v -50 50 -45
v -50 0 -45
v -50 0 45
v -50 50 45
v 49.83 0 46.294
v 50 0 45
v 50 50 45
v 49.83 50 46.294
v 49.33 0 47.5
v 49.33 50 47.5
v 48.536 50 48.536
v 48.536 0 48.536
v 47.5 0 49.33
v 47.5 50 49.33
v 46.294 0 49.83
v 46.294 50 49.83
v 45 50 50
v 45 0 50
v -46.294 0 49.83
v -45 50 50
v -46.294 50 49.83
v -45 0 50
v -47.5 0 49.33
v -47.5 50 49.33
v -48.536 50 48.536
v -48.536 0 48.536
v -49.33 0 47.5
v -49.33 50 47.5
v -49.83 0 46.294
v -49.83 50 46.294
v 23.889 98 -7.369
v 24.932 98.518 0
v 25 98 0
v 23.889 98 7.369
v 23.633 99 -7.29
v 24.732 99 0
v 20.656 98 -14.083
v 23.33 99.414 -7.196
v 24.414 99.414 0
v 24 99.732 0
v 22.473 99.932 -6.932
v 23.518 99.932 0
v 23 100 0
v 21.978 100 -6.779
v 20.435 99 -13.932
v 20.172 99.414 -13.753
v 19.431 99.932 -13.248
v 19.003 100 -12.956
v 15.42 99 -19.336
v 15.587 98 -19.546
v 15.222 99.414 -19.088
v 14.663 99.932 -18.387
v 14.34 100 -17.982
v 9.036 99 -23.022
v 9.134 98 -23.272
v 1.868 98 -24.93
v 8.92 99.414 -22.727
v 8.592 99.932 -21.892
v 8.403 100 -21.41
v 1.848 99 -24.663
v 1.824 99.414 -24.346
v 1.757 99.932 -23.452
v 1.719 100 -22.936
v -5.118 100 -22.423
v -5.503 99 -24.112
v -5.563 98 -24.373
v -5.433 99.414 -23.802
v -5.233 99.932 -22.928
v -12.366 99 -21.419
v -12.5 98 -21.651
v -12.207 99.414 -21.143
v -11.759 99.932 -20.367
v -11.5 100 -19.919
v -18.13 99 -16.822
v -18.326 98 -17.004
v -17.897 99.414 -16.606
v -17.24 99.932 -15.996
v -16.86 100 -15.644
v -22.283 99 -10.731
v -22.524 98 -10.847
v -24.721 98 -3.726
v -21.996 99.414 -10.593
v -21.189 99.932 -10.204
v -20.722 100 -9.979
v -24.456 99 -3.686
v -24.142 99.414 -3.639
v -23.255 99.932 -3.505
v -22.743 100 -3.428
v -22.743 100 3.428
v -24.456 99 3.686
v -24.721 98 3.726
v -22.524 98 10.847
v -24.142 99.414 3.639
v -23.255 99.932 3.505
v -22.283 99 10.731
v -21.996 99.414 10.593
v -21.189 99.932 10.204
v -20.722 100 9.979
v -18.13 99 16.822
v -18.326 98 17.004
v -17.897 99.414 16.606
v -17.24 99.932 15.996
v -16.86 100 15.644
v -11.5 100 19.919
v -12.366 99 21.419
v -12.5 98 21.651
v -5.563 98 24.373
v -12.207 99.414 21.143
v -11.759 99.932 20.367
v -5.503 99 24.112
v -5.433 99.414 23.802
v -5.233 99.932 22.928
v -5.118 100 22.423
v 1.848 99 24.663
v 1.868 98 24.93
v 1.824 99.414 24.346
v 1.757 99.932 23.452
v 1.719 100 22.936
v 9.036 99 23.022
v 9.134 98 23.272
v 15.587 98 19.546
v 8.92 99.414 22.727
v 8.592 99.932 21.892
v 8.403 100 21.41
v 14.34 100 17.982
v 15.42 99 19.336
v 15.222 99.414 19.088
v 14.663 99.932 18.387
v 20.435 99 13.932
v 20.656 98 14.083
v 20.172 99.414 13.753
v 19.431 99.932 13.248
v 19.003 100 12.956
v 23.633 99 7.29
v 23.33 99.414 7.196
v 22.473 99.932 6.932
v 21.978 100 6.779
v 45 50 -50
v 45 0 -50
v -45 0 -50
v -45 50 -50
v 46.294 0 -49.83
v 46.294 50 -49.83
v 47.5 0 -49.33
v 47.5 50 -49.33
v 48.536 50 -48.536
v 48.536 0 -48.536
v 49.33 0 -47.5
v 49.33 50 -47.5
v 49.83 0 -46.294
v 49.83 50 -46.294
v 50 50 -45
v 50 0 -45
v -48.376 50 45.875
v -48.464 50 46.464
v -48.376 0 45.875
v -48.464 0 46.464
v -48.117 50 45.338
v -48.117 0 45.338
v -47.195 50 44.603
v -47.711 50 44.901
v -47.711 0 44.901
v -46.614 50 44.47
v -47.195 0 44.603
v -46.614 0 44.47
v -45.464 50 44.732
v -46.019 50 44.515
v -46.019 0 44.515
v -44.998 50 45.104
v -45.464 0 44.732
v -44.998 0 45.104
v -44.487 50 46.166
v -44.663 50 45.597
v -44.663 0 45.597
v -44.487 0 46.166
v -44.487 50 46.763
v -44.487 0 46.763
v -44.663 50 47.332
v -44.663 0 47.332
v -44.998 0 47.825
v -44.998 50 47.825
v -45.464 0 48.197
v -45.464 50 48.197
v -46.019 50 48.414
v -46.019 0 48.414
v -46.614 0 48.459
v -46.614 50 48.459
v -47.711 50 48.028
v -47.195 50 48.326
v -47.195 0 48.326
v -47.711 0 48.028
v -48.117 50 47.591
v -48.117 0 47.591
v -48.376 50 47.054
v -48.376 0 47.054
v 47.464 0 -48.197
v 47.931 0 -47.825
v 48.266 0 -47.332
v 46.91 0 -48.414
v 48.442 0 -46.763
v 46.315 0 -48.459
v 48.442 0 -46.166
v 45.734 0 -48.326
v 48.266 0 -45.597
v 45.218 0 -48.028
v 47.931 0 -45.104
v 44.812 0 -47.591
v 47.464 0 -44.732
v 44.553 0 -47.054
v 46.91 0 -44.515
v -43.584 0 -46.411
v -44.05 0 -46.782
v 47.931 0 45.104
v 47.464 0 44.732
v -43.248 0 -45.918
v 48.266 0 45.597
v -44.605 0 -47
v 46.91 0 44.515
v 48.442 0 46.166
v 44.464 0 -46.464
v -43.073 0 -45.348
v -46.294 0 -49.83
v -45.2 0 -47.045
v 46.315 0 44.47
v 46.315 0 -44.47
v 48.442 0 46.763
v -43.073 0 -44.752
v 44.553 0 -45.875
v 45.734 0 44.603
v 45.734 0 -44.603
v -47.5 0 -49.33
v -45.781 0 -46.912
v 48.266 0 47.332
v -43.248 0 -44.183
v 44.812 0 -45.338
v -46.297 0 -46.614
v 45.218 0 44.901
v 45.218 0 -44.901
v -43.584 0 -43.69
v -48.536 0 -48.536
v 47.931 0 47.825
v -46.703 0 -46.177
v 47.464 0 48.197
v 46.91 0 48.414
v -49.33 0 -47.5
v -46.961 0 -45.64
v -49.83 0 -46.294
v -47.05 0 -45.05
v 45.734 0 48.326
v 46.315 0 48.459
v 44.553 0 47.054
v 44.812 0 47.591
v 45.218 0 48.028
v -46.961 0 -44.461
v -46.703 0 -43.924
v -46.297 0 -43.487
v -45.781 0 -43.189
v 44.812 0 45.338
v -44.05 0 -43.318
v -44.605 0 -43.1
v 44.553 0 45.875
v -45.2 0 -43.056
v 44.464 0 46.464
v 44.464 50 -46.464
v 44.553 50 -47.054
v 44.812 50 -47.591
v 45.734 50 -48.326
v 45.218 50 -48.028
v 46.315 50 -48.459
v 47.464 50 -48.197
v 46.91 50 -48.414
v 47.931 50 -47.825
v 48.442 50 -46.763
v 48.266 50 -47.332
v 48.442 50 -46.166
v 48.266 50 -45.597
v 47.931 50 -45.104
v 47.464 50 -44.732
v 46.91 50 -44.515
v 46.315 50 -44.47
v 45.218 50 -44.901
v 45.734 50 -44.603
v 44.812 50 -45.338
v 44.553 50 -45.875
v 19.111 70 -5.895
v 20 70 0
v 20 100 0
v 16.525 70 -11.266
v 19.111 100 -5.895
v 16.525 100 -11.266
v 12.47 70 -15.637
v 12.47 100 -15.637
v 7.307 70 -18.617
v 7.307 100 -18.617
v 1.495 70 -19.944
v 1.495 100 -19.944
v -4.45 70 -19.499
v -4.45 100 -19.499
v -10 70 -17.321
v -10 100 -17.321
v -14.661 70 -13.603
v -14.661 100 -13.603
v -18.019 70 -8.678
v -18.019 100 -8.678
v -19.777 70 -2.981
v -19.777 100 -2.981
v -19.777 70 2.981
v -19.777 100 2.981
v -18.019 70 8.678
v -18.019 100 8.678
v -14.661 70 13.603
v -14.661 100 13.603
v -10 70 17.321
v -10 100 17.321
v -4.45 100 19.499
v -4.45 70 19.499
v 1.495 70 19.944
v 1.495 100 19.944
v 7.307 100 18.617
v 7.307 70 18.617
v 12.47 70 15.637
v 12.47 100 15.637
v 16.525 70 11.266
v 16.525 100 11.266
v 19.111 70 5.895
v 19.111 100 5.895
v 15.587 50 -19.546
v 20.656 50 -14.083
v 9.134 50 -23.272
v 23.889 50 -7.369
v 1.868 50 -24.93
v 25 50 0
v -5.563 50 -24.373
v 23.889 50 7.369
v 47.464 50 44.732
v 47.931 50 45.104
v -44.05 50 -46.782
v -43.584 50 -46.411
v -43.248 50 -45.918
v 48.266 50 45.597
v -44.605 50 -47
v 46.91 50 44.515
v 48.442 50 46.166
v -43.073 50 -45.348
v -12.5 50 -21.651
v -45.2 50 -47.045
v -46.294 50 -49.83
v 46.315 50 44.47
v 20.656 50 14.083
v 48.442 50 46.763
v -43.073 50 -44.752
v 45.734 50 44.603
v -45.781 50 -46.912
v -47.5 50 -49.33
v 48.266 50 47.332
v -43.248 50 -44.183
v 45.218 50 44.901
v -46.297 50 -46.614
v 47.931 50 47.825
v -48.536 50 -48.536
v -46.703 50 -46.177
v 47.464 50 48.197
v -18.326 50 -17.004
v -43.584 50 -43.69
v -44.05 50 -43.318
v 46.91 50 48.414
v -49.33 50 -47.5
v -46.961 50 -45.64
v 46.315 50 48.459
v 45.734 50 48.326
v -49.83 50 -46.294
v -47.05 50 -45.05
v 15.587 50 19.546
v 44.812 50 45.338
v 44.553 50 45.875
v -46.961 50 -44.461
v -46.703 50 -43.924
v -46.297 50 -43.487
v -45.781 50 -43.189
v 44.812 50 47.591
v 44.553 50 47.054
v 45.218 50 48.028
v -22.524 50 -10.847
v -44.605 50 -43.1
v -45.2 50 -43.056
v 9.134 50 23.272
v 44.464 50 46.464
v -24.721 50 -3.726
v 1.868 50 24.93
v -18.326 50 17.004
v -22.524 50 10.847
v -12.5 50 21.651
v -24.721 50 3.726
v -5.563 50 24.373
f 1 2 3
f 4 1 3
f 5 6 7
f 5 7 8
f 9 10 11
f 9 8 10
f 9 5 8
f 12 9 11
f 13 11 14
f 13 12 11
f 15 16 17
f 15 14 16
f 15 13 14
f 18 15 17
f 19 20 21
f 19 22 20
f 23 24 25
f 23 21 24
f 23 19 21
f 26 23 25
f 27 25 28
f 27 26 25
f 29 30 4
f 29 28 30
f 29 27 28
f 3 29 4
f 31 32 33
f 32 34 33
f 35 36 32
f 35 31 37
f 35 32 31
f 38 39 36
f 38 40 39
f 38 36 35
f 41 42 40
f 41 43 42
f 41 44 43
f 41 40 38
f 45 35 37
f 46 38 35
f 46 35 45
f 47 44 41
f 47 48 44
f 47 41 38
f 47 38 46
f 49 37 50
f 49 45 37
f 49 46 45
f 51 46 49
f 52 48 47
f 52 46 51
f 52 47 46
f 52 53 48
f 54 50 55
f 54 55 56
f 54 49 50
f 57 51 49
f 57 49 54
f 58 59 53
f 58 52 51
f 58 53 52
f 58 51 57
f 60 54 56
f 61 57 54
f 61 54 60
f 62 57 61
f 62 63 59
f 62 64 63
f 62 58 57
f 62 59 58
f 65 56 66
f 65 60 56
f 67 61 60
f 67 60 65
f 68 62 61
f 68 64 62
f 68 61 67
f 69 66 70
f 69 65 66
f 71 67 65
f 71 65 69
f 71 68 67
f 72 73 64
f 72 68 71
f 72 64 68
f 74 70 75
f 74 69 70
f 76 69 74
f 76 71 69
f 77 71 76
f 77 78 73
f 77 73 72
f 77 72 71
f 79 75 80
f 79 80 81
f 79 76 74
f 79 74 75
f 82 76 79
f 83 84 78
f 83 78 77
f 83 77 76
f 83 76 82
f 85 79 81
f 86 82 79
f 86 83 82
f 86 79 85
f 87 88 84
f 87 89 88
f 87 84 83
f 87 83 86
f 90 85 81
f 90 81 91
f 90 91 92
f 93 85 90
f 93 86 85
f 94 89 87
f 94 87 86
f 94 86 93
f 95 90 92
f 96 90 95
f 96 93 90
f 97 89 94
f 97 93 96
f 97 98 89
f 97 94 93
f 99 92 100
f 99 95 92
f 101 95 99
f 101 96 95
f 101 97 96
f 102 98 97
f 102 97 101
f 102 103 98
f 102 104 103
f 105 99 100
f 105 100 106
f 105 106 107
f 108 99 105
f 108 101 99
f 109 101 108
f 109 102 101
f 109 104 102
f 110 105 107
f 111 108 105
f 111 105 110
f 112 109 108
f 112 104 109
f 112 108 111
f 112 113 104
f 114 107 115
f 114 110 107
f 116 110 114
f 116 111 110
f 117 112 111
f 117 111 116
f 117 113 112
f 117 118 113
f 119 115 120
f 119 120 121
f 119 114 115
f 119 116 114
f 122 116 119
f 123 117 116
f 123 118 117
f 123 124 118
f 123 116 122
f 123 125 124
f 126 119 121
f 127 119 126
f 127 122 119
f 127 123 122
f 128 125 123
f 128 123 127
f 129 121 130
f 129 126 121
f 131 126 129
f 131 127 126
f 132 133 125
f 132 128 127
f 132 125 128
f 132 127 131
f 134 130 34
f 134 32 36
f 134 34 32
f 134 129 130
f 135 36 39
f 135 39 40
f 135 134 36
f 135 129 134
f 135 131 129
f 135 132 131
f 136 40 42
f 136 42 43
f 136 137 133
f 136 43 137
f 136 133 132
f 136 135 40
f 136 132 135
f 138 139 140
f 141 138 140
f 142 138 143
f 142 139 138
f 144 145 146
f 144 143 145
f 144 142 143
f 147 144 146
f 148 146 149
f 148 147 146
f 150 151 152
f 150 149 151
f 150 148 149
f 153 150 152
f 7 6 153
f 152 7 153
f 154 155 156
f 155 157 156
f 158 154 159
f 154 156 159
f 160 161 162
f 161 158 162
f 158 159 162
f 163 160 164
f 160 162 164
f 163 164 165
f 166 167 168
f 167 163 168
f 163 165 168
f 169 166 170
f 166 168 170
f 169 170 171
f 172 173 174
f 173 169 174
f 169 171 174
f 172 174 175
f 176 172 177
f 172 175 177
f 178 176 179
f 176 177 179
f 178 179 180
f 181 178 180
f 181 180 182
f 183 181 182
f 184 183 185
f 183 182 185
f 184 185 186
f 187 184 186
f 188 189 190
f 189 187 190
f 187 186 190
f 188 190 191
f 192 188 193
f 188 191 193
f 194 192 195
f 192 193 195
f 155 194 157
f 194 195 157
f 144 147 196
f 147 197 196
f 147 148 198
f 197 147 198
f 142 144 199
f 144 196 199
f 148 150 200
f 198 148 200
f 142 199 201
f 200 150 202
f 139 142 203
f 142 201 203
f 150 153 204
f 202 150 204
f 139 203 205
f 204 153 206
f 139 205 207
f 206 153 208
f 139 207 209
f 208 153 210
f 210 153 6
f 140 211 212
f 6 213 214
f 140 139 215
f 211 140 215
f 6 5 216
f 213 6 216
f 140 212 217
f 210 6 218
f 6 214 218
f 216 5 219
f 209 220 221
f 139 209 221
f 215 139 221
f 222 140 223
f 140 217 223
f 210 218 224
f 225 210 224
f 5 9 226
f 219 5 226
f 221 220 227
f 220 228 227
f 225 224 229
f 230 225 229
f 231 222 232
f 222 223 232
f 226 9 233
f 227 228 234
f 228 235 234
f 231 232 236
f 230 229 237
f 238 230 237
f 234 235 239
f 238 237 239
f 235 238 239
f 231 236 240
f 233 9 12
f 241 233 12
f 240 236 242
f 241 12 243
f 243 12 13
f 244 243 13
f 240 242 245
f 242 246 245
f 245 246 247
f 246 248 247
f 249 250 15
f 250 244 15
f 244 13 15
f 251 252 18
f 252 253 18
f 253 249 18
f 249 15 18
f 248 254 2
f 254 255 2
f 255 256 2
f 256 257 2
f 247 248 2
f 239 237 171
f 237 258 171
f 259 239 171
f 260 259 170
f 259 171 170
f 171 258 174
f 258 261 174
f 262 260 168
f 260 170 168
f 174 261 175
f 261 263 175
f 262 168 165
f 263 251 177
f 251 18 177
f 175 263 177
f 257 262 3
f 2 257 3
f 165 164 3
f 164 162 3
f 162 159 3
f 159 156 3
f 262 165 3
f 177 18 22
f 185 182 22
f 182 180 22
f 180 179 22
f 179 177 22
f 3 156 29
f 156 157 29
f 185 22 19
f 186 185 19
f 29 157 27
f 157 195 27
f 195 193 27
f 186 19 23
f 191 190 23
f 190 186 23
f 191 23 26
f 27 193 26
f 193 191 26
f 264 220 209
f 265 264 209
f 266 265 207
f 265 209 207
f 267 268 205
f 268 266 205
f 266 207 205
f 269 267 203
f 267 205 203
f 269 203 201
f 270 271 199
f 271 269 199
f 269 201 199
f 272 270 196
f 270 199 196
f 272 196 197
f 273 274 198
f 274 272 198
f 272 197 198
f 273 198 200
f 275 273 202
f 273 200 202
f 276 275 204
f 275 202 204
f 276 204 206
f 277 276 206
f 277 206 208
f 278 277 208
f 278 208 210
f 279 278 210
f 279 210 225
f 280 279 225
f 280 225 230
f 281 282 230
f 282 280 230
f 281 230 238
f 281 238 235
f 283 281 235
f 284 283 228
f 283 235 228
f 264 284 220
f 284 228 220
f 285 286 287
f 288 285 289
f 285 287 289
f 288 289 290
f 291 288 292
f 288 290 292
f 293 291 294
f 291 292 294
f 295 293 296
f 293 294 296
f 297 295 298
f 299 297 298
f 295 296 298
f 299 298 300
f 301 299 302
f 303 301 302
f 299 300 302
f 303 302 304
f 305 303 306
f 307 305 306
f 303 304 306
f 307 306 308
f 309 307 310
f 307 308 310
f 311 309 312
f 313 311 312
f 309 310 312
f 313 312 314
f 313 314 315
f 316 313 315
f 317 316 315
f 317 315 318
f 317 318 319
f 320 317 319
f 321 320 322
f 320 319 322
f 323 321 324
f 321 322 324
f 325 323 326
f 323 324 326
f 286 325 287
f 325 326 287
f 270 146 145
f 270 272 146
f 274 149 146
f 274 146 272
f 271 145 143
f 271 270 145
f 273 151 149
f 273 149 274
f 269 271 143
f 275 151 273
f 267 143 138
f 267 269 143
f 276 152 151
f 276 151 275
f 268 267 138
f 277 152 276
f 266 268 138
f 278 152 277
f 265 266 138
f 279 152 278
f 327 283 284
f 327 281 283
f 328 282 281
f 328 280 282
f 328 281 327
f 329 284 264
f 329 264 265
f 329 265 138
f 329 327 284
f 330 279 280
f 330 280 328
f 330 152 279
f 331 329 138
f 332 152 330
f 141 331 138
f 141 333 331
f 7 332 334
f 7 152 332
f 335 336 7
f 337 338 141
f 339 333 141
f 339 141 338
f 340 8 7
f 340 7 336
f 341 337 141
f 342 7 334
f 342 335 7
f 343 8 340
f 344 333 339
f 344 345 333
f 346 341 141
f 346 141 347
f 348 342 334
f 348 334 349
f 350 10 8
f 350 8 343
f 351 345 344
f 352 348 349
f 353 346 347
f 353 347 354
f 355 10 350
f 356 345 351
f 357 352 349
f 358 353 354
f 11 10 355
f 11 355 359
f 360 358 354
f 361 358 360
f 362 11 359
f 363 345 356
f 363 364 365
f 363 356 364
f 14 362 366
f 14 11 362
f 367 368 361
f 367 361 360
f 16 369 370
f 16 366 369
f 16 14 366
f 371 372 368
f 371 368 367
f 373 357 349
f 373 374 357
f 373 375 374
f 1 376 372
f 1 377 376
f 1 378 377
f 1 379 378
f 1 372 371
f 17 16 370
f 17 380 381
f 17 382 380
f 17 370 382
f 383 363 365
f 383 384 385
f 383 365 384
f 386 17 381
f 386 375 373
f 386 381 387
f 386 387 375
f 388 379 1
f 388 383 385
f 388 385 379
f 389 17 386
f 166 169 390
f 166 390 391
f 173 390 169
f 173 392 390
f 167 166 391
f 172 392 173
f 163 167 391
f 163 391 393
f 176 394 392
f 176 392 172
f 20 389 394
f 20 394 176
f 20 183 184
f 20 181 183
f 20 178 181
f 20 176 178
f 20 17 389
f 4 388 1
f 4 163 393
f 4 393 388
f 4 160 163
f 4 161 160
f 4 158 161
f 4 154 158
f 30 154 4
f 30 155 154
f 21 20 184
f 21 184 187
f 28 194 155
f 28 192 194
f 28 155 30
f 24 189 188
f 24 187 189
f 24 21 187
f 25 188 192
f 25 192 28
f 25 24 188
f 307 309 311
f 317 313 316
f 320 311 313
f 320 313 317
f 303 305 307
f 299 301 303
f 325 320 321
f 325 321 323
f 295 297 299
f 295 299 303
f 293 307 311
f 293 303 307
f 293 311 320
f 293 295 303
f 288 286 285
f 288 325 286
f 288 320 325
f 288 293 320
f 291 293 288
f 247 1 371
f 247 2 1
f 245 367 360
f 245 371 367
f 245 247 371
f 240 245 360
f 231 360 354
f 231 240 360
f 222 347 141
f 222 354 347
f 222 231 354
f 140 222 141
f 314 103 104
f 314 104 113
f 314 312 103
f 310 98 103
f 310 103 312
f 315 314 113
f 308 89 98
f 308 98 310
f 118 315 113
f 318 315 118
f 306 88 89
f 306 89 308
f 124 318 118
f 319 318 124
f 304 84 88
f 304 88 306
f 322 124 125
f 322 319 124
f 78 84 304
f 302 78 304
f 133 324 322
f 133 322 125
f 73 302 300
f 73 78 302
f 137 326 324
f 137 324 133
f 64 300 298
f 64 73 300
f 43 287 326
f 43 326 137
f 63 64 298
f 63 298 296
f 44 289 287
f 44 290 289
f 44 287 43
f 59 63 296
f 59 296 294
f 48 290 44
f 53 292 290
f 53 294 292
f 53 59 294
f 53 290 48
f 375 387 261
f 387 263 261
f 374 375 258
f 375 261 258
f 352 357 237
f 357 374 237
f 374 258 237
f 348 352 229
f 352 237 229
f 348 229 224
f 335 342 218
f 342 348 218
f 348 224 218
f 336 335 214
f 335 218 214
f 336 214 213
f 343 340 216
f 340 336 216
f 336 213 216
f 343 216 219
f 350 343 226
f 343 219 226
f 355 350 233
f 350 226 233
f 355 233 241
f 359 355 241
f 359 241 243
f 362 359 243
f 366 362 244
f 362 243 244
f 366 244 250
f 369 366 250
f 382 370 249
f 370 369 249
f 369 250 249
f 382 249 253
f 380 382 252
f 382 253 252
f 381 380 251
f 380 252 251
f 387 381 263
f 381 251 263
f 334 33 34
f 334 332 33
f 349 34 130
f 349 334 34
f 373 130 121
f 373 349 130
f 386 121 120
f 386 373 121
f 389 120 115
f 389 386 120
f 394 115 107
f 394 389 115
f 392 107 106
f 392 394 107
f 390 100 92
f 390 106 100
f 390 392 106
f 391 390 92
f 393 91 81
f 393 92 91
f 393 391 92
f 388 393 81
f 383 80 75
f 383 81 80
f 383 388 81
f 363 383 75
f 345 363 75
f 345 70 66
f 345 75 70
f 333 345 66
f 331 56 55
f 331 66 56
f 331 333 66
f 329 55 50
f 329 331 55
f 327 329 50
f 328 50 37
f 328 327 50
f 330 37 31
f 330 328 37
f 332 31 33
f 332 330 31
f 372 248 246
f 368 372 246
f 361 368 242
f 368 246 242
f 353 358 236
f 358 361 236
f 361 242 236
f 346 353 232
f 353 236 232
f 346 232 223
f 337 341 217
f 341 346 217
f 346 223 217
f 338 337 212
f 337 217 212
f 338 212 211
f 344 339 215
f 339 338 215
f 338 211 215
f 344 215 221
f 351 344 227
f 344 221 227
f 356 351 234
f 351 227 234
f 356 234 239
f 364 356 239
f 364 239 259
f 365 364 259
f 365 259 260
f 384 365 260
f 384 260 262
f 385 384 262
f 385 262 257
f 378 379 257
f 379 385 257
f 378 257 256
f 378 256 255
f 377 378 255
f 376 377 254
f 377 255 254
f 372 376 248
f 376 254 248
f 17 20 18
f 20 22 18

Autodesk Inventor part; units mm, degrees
ref_plane "YZ Plane" through (0, 0, 0) normal (1, 0, 0) x (0, 1, 0)
ref_plane "XZ Plane" through (0, 0, 0) normal (0, 1, 0) x (-1, 0, 0)
ref_plane "XY Plane" through (0, 0, 0) normal (0, 0, 1) x (1, 0, 0)
sketch "Sketch1" plane through (0, 0, 0) normal (0, 1, 0) x (-1, 0, 0)
  line L0 (-50, 45) -> (-50, -45)
  line L1 (-45, -50) -> (45, -50)
  line L2 (50, -45) -> (50, 45)
  line L3 (45, 50) -> (-45, 50)
  circle A0 centre (46.4645, 46.4645) radius 2
  arc A1 (50, 45) -> (45, 50) centre (45, 45) ccw
  circle A2 centre (45.0503, -45.0503) radius 2
  arc A3 (45, -50) -> (50, -45) centre (45, -45) ccw
  line L4 (48.5355, -48.5355) -> (50, -50) construction
  circle A4 centre (-46.4645, 46.4645) radius 2
  circle A5 centre (-46.4645, -46.4645) radius 2
  arc A6 (-45, 50) -> (-50, 45) centre (-45, 45) ccw
  arc A7 (-50, -45) -> (-45, -50) centre (-45, -45) ccw
  line L5 (-50, 50) -> (-47.8787, 47.8787) construction
  line L6 (-45.0503, 45.0503) -> (46.4645, -46.4645) construction
  line L7 (-50, -50) -> (-47.8787, -47.8787) construction
  line L8 (-45.0503, -45.0503) -> (45.0503, 45.0503) construction
  point P0 (0, 0)
  dimension "d0" = 100
  dimension "d1" = 100
extrude "Extrusion1" add sketch "Sketch1" along normal blind 50
sketch "Sketch2" plane through (0, 50, 0) normal (0, 1, 0) x (1, 0, 0)
  circle A0 centre (0, 0) radius 25
extrude "Extrusion2" add sketch "Sketch2" along normal blind 50
sketch "Sketch3" plane through (0, 100, 0) normal (0, 1, 0) x (1, 0, 0)
  circle A0 centre (0, 0) radius 20
  dimension "d18" = 40
extrude "Extrusion3" cut sketch "Sketch3" against normal blind 30
thread "Thread1" size "M40x3" class "6H" standard "ANSI Metric M Profile" full length
fillet "Fillet1" radius 2 1 edges at (-25, 100, 0)
